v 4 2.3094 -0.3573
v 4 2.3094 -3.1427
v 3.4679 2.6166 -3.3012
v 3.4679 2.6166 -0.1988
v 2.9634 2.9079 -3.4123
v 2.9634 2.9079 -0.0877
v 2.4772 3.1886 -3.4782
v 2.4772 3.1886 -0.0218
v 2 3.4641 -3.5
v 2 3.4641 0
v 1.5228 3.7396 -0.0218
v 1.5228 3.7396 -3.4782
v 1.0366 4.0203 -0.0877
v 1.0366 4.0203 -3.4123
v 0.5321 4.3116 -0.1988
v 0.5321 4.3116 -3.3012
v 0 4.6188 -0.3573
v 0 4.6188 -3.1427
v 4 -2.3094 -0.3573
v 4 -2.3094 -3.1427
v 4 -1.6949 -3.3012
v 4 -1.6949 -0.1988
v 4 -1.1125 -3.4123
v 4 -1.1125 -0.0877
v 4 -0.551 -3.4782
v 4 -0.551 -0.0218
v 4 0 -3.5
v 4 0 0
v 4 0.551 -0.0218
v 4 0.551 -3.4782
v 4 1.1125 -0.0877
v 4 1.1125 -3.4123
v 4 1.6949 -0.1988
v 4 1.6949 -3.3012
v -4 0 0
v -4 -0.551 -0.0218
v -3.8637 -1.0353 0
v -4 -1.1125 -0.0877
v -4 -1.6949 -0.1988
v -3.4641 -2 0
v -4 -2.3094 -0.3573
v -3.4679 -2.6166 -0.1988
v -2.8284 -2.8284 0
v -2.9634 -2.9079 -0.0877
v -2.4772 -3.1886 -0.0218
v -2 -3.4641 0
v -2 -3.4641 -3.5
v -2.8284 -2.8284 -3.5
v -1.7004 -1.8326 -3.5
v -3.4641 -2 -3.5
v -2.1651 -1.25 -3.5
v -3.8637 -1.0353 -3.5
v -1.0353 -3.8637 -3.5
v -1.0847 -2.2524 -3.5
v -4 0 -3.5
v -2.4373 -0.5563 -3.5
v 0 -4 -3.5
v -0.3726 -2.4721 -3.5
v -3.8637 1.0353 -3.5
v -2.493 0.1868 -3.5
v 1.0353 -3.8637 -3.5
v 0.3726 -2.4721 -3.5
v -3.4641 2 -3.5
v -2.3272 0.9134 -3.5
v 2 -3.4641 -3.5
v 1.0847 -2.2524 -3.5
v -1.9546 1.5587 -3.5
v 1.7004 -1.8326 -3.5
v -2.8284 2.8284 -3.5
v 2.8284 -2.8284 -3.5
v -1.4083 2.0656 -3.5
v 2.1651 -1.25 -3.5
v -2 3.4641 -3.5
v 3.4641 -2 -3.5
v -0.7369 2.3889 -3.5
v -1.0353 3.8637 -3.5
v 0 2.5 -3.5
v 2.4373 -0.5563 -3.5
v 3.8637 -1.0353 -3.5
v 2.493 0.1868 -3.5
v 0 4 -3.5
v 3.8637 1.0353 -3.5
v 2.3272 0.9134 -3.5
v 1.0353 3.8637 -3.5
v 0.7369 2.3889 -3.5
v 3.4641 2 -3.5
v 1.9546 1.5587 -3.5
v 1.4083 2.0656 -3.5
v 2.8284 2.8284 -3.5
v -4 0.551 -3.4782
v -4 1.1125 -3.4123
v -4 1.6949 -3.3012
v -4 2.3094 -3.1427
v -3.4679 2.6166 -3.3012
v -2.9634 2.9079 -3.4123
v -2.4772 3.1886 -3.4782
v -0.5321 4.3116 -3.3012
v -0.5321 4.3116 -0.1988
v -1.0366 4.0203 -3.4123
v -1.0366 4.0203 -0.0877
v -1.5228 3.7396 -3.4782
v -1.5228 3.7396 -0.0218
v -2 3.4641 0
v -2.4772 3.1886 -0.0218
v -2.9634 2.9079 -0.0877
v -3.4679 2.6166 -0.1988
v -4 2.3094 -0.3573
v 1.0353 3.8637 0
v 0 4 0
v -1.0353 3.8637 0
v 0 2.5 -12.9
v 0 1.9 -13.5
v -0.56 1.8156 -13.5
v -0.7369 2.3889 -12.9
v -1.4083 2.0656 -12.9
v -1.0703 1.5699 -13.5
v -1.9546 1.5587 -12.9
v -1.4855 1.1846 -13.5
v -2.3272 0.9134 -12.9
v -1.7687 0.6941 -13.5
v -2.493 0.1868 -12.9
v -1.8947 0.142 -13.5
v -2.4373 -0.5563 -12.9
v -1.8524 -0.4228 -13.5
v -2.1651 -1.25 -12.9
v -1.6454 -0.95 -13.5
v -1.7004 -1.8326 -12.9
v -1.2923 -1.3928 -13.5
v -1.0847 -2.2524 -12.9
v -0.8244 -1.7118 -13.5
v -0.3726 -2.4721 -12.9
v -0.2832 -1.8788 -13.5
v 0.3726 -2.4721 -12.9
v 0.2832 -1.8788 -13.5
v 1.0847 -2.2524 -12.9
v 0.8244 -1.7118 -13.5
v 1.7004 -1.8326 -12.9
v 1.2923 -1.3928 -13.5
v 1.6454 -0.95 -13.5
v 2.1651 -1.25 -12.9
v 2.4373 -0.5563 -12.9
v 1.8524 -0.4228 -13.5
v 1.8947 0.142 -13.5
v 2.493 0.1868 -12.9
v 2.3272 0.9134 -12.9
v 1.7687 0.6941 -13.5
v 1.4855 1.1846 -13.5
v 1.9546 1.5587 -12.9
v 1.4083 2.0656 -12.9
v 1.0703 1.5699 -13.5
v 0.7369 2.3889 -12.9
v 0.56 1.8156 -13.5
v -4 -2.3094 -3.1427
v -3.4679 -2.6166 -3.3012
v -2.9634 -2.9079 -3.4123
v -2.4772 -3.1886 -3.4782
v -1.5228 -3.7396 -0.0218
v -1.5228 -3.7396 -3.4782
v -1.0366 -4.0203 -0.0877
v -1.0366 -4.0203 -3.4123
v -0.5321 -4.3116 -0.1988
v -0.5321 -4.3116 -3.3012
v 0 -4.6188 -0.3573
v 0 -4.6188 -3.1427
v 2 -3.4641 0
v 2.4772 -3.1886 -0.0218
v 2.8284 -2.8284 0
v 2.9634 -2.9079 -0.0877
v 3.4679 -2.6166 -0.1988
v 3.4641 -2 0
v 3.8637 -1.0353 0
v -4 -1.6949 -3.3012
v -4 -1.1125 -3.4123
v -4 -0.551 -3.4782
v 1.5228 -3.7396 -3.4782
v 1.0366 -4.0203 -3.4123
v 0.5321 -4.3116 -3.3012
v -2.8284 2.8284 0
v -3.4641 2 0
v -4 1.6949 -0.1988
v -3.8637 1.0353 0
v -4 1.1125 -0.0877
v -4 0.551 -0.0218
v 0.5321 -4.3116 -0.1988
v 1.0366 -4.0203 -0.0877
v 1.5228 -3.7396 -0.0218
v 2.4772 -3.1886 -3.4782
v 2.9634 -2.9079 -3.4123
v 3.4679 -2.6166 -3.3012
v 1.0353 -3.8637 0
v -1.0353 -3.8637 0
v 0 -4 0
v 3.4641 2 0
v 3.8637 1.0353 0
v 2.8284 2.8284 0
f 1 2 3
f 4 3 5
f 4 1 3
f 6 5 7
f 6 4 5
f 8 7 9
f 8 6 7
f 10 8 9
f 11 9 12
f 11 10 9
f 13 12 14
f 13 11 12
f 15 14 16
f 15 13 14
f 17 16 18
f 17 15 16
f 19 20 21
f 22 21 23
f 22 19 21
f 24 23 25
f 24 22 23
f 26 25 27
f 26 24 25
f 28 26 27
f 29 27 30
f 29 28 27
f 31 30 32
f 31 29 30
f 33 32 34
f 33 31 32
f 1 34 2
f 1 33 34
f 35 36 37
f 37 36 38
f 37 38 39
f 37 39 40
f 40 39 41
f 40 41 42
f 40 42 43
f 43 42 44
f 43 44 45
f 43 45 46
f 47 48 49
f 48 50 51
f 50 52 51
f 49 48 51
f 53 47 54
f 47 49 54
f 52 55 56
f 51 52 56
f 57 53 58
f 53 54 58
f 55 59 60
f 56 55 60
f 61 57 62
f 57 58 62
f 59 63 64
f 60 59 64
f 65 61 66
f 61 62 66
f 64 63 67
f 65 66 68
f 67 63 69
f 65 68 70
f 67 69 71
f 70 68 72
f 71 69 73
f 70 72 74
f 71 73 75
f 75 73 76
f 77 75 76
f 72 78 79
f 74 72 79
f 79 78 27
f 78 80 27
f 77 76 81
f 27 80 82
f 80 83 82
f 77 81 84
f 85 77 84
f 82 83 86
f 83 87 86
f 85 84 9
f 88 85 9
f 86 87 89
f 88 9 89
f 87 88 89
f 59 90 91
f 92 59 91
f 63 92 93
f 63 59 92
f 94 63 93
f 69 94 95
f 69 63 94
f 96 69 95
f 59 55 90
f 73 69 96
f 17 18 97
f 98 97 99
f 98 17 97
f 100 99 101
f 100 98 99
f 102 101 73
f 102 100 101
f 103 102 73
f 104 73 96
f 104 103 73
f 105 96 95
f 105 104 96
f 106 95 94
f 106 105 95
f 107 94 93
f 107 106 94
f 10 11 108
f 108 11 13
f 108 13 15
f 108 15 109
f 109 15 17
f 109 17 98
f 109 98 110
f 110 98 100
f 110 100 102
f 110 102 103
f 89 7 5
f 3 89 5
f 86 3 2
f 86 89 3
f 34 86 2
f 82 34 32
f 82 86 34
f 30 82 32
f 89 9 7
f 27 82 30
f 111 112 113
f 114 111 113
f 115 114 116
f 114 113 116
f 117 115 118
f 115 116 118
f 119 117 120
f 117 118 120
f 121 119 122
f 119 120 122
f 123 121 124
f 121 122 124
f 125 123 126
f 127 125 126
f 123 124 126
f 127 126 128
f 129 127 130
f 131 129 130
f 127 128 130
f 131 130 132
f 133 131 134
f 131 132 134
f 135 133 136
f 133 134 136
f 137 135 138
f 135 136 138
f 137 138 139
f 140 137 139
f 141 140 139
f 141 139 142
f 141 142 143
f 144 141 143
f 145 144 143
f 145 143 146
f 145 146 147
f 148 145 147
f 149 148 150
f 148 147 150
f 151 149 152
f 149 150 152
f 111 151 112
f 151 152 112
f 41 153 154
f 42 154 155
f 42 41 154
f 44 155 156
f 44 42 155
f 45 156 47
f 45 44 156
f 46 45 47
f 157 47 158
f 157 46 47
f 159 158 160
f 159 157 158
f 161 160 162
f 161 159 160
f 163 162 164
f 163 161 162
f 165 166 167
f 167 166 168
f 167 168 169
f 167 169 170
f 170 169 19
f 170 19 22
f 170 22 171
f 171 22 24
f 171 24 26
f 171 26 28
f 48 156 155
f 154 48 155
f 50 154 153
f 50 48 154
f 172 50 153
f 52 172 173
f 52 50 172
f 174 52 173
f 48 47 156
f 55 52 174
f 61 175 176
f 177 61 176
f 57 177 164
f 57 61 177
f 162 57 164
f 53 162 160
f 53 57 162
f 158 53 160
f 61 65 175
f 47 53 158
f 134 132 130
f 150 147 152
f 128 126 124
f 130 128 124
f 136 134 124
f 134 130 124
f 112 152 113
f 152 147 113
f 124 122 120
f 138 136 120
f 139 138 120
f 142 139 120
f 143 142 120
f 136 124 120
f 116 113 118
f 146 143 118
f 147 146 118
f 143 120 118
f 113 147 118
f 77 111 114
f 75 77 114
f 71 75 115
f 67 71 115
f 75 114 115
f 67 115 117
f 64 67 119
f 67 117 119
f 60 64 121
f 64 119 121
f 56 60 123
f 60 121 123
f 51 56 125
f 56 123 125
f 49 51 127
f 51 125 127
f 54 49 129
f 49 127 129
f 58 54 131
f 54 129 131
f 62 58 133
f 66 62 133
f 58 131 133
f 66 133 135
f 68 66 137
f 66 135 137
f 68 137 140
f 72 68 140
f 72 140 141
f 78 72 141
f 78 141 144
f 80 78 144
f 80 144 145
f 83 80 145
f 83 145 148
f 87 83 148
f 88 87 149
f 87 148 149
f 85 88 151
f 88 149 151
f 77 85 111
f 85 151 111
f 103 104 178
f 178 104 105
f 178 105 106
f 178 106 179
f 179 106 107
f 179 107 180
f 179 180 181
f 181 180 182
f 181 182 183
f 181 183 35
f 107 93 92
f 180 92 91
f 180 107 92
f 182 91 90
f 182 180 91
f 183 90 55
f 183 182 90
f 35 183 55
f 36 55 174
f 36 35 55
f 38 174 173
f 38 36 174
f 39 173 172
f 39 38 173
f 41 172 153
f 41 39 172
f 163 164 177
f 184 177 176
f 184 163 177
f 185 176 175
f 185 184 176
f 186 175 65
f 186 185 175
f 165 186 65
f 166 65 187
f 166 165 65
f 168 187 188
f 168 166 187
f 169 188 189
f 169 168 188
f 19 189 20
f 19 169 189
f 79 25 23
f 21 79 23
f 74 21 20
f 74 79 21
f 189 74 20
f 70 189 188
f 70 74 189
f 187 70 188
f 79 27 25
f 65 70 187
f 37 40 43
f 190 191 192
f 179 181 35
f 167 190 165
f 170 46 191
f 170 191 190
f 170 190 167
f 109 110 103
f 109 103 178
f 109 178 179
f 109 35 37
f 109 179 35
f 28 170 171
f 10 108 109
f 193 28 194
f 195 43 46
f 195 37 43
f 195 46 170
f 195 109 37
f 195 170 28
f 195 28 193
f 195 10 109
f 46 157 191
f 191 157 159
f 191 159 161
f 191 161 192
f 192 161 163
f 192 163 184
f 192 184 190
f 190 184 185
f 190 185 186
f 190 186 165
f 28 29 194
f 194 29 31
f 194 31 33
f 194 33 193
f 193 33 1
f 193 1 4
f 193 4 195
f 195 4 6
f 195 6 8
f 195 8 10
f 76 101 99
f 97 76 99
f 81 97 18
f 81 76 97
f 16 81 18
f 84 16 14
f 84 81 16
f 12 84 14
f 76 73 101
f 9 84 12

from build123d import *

# Parameters (mm, degrees)
BOSS_EXTRUDE1_DEPTH = 3.5
SKETCH16_OUTSIDE_W  = 57.702
SKETCH16_OUTSIDE_H  = 58.94
SKETCH16_OUTSIDE_R  = 4
CUT_EXTRUDE7_DEPTH  = 12.718930555
CUT_EXTRUDE7_DRAFT  = -60
CHAMFER1_SIZE       = 0.6


with BuildPart() as part:
    # Sketch1 → Revolve1 (revolve)
    with BuildSketch(Plane(origin=(0, 0, 0), x_dir=(0, 0, -1), z_dir=(1, 0, 0))):
        Polygon((3.5, 2.5), (13.5, 2.5), (13.5, 0), (0, 0), (0, 4), (3.5, 4), align=None)
    revolve(axis=Axis((0, 0, -13.5), (0, 0, 1)))

    # Sketch2 → Boss-Extrude1 (add)
    with BuildSketch(Plane.XY):
        Polygon((4, 2.309401077), (0, 4.618802154), (-4, 2.309401077), (-4, -2.309401077), (0, -4.618802154), (4, -2.309401077), align=None)
    extrude(amount=-BOSS_EXTRUDE1_DEPTH)

    # Cut-Extrude2: read off the stored shape, not the designer's step
    # Cut-Extrude2 outline → Cut-Extrude2 (revolve, cut)
    with BuildSketch(Plane.XZ):
        Polygon((4.618802154, 2.09e-07), (3.999999819, 2.09e-07), (4.618802154, -0.35726559), align=None)
    revolve(axis=Axis((0, 0, 0), (0, 0, 1)), mode=Mode.SUBTRACT)

    # Cut-Extrude2 2 outline → Cut-Extrude2 2 (revolve, cut)
    with BuildSketch(Plane.XZ):
        Polygon((4.618802154, 2.09e-07), (3.999999819, 2.09e-07), (4.618802154, -0.35726559), align=None)
    revolve(axis=Axis((0, 0, 0), (0, 0, 1)), mode=Mode.SUBTRACT)


with BuildPart() as cut_extrude7_tool:
    # Sketch16 outside → Cut-Extrude7 (with draft: the straight prism first)
    with BuildSketch(Plane(origin=(0, 0, -3.5), x_dir=(-1, 0, 0), z_dir=(0, 0, -1))):
        Rectangle(SKETCH16_OUTSIDE_W, SKETCH16_OUTSIDE_H)
        Circle(SKETCH16_OUTSIDE_R, mode=Mode.SUBTRACT)
    extrude(amount=-CUT_EXTRUDE7_DEPTH)
    # Cut-Extrude7: the draft: its side faces are tilted about the plane it starts from
    cut_extrude7_sides = [cut_extrude7_tool.faces().sort_by_distance(p)[0] for p in [
        (0, -29.47, 2.859465277),
        (-28.851, 0, 2.859465277),
        (0, 29.47, 2.859465277),
        (28.851, 0, 2.859465277),
        (4, 0, 2.859465277),
    ]]
    draft(cut_extrude7_sides, Plane(origin=(0, 0, -3.5), x_dir=(-1, 0, 0), z_dir=(0, 0, -1)), CUT_EXTRUDE7_DRAFT)


with BuildPart() as part_1:
    add(part.part)

    # Cut-Extrude7: cut by cut_extrude7_tool
    add(cut_extrude7_tool.part, mode=Mode.SUBTRACT)

    # Chamfer1
    chamfer1_edges = [part_1.edges().sort_by_distance(p)[0] for p in [
        (0, -2.5, -13.5),
    ]]
    chamfer(chamfer1_edges, length=CHAMFER1_SIZE)


solid = part_1.part
